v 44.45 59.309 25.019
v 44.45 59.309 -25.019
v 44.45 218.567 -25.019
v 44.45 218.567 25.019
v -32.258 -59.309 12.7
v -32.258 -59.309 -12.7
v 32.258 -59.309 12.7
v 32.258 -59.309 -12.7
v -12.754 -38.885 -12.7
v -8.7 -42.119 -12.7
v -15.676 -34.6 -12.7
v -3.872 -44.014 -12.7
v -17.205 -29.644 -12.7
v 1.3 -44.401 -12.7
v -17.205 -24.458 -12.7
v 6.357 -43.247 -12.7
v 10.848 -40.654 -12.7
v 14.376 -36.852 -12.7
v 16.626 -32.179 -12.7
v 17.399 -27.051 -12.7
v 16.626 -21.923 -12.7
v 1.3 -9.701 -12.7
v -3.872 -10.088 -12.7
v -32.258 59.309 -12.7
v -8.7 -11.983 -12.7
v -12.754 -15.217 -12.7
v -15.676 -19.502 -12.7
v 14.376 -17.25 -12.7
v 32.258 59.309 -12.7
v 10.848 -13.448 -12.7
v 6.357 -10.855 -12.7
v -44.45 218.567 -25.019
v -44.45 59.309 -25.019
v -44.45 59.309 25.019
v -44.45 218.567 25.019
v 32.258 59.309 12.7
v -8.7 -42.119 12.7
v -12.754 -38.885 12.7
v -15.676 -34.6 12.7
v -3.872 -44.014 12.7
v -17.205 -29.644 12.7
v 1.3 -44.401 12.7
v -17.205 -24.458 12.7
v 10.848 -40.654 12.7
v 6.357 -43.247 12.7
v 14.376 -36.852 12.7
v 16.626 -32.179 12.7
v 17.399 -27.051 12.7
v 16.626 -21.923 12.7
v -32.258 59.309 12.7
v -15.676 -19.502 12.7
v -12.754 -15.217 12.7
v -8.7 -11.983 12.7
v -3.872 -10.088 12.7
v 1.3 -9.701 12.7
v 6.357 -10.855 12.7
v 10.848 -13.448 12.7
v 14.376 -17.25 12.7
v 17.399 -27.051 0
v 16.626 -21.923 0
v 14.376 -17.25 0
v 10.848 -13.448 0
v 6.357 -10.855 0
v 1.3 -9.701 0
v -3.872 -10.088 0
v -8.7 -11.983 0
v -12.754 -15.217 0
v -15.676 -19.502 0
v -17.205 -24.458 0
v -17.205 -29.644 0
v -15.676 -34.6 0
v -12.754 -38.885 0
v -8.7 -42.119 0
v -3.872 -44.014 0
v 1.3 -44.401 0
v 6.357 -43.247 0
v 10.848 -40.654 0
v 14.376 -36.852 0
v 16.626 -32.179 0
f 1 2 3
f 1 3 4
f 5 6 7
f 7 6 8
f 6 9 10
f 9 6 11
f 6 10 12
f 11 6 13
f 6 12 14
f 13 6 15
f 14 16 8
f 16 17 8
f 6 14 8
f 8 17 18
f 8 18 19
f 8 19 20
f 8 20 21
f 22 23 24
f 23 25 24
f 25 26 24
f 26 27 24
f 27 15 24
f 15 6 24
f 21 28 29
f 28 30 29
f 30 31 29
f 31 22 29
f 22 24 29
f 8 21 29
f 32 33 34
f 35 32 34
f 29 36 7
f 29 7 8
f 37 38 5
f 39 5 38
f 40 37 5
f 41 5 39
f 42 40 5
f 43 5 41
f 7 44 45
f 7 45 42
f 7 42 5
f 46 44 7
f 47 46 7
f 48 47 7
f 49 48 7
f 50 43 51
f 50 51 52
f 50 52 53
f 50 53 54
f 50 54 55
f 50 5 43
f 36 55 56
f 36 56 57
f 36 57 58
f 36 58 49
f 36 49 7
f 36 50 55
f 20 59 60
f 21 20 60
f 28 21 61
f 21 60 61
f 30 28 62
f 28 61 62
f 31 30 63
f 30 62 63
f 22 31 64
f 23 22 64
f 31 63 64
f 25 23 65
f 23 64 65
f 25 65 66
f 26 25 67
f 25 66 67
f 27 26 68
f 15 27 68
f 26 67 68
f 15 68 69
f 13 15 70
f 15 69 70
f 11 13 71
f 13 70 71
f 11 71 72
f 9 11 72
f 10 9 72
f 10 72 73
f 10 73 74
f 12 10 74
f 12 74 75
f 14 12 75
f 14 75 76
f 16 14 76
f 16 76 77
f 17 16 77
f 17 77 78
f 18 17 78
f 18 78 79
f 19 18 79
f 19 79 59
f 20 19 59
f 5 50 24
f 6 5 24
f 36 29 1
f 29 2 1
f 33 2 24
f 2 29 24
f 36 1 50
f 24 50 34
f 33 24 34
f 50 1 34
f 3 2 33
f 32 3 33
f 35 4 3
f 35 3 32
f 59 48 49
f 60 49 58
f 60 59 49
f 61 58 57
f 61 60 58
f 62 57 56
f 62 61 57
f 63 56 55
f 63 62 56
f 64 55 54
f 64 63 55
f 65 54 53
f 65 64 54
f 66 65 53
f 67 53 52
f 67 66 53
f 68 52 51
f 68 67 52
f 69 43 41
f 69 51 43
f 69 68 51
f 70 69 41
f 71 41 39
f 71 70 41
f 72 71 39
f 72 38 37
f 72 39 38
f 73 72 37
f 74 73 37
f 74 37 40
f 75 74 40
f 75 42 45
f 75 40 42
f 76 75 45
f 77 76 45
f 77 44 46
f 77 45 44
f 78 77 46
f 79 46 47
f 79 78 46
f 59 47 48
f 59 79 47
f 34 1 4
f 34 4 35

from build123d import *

# Parameters (mm, degrees)
SKETCH1_W               = 64.516
SKETCH1_H               = 25.4
EXTRUDE2_DEPTH          = 59.309
EXTRUDE2_DEPTH_BACK     = 59.309
SKETCH2_R               = 17.399
CUT_EXTRUDE1_DEPTH      = 13.7
CUT_EXTRUDE1_DEPTH_BACK = 13.7
SKETCH3_W               = 88.9
SKETCH3_H               = 50.038
EXTRUDE3_DEPTH          = 159.258


with BuildPart() as part:
    # Sketch1 → Extrude2 (new body, two sides)
    with BuildSketch(Plane(origin=(0, 0, 0), x_dir=(1, 0, 0), z_dir=(0, 1, 0))) as extrude2_sk:
        Rectangle(SKETCH1_W, SKETCH1_H)
    extrude(amount=EXTRUDE2_DEPTH)
    extrude(extrude2_sk.sketch, amount=-EXTRUDE2_DEPTH_BACK)

    # Sketch2 → Cut-Extrude1 (cut, two sides)
    with BuildSketch(Plane.XY) as cut_extrude1_sk:
        with Locations((0, -27.051)):
            Circle(SKETCH2_R)
    extrude(amount=CUT_EXTRUDE1_DEPTH, mode=Mode.SUBTRACT)
    extrude(cut_extrude1_sk.sketch, amount=-CUT_EXTRUDE1_DEPTH_BACK, mode=Mode.SUBTRACT)

    # Sketch3 → Extrude3 (add)
    with BuildSketch(Plane(origin=(0, 59.309, 0), x_dir=(-1, 0, 0), z_dir=(0, 1, 0))):
        Rectangle(SKETCH3_W, SKETCH3_H)
    extrude(amount=EXTRUDE3_DEPTH)


solid = part.part
